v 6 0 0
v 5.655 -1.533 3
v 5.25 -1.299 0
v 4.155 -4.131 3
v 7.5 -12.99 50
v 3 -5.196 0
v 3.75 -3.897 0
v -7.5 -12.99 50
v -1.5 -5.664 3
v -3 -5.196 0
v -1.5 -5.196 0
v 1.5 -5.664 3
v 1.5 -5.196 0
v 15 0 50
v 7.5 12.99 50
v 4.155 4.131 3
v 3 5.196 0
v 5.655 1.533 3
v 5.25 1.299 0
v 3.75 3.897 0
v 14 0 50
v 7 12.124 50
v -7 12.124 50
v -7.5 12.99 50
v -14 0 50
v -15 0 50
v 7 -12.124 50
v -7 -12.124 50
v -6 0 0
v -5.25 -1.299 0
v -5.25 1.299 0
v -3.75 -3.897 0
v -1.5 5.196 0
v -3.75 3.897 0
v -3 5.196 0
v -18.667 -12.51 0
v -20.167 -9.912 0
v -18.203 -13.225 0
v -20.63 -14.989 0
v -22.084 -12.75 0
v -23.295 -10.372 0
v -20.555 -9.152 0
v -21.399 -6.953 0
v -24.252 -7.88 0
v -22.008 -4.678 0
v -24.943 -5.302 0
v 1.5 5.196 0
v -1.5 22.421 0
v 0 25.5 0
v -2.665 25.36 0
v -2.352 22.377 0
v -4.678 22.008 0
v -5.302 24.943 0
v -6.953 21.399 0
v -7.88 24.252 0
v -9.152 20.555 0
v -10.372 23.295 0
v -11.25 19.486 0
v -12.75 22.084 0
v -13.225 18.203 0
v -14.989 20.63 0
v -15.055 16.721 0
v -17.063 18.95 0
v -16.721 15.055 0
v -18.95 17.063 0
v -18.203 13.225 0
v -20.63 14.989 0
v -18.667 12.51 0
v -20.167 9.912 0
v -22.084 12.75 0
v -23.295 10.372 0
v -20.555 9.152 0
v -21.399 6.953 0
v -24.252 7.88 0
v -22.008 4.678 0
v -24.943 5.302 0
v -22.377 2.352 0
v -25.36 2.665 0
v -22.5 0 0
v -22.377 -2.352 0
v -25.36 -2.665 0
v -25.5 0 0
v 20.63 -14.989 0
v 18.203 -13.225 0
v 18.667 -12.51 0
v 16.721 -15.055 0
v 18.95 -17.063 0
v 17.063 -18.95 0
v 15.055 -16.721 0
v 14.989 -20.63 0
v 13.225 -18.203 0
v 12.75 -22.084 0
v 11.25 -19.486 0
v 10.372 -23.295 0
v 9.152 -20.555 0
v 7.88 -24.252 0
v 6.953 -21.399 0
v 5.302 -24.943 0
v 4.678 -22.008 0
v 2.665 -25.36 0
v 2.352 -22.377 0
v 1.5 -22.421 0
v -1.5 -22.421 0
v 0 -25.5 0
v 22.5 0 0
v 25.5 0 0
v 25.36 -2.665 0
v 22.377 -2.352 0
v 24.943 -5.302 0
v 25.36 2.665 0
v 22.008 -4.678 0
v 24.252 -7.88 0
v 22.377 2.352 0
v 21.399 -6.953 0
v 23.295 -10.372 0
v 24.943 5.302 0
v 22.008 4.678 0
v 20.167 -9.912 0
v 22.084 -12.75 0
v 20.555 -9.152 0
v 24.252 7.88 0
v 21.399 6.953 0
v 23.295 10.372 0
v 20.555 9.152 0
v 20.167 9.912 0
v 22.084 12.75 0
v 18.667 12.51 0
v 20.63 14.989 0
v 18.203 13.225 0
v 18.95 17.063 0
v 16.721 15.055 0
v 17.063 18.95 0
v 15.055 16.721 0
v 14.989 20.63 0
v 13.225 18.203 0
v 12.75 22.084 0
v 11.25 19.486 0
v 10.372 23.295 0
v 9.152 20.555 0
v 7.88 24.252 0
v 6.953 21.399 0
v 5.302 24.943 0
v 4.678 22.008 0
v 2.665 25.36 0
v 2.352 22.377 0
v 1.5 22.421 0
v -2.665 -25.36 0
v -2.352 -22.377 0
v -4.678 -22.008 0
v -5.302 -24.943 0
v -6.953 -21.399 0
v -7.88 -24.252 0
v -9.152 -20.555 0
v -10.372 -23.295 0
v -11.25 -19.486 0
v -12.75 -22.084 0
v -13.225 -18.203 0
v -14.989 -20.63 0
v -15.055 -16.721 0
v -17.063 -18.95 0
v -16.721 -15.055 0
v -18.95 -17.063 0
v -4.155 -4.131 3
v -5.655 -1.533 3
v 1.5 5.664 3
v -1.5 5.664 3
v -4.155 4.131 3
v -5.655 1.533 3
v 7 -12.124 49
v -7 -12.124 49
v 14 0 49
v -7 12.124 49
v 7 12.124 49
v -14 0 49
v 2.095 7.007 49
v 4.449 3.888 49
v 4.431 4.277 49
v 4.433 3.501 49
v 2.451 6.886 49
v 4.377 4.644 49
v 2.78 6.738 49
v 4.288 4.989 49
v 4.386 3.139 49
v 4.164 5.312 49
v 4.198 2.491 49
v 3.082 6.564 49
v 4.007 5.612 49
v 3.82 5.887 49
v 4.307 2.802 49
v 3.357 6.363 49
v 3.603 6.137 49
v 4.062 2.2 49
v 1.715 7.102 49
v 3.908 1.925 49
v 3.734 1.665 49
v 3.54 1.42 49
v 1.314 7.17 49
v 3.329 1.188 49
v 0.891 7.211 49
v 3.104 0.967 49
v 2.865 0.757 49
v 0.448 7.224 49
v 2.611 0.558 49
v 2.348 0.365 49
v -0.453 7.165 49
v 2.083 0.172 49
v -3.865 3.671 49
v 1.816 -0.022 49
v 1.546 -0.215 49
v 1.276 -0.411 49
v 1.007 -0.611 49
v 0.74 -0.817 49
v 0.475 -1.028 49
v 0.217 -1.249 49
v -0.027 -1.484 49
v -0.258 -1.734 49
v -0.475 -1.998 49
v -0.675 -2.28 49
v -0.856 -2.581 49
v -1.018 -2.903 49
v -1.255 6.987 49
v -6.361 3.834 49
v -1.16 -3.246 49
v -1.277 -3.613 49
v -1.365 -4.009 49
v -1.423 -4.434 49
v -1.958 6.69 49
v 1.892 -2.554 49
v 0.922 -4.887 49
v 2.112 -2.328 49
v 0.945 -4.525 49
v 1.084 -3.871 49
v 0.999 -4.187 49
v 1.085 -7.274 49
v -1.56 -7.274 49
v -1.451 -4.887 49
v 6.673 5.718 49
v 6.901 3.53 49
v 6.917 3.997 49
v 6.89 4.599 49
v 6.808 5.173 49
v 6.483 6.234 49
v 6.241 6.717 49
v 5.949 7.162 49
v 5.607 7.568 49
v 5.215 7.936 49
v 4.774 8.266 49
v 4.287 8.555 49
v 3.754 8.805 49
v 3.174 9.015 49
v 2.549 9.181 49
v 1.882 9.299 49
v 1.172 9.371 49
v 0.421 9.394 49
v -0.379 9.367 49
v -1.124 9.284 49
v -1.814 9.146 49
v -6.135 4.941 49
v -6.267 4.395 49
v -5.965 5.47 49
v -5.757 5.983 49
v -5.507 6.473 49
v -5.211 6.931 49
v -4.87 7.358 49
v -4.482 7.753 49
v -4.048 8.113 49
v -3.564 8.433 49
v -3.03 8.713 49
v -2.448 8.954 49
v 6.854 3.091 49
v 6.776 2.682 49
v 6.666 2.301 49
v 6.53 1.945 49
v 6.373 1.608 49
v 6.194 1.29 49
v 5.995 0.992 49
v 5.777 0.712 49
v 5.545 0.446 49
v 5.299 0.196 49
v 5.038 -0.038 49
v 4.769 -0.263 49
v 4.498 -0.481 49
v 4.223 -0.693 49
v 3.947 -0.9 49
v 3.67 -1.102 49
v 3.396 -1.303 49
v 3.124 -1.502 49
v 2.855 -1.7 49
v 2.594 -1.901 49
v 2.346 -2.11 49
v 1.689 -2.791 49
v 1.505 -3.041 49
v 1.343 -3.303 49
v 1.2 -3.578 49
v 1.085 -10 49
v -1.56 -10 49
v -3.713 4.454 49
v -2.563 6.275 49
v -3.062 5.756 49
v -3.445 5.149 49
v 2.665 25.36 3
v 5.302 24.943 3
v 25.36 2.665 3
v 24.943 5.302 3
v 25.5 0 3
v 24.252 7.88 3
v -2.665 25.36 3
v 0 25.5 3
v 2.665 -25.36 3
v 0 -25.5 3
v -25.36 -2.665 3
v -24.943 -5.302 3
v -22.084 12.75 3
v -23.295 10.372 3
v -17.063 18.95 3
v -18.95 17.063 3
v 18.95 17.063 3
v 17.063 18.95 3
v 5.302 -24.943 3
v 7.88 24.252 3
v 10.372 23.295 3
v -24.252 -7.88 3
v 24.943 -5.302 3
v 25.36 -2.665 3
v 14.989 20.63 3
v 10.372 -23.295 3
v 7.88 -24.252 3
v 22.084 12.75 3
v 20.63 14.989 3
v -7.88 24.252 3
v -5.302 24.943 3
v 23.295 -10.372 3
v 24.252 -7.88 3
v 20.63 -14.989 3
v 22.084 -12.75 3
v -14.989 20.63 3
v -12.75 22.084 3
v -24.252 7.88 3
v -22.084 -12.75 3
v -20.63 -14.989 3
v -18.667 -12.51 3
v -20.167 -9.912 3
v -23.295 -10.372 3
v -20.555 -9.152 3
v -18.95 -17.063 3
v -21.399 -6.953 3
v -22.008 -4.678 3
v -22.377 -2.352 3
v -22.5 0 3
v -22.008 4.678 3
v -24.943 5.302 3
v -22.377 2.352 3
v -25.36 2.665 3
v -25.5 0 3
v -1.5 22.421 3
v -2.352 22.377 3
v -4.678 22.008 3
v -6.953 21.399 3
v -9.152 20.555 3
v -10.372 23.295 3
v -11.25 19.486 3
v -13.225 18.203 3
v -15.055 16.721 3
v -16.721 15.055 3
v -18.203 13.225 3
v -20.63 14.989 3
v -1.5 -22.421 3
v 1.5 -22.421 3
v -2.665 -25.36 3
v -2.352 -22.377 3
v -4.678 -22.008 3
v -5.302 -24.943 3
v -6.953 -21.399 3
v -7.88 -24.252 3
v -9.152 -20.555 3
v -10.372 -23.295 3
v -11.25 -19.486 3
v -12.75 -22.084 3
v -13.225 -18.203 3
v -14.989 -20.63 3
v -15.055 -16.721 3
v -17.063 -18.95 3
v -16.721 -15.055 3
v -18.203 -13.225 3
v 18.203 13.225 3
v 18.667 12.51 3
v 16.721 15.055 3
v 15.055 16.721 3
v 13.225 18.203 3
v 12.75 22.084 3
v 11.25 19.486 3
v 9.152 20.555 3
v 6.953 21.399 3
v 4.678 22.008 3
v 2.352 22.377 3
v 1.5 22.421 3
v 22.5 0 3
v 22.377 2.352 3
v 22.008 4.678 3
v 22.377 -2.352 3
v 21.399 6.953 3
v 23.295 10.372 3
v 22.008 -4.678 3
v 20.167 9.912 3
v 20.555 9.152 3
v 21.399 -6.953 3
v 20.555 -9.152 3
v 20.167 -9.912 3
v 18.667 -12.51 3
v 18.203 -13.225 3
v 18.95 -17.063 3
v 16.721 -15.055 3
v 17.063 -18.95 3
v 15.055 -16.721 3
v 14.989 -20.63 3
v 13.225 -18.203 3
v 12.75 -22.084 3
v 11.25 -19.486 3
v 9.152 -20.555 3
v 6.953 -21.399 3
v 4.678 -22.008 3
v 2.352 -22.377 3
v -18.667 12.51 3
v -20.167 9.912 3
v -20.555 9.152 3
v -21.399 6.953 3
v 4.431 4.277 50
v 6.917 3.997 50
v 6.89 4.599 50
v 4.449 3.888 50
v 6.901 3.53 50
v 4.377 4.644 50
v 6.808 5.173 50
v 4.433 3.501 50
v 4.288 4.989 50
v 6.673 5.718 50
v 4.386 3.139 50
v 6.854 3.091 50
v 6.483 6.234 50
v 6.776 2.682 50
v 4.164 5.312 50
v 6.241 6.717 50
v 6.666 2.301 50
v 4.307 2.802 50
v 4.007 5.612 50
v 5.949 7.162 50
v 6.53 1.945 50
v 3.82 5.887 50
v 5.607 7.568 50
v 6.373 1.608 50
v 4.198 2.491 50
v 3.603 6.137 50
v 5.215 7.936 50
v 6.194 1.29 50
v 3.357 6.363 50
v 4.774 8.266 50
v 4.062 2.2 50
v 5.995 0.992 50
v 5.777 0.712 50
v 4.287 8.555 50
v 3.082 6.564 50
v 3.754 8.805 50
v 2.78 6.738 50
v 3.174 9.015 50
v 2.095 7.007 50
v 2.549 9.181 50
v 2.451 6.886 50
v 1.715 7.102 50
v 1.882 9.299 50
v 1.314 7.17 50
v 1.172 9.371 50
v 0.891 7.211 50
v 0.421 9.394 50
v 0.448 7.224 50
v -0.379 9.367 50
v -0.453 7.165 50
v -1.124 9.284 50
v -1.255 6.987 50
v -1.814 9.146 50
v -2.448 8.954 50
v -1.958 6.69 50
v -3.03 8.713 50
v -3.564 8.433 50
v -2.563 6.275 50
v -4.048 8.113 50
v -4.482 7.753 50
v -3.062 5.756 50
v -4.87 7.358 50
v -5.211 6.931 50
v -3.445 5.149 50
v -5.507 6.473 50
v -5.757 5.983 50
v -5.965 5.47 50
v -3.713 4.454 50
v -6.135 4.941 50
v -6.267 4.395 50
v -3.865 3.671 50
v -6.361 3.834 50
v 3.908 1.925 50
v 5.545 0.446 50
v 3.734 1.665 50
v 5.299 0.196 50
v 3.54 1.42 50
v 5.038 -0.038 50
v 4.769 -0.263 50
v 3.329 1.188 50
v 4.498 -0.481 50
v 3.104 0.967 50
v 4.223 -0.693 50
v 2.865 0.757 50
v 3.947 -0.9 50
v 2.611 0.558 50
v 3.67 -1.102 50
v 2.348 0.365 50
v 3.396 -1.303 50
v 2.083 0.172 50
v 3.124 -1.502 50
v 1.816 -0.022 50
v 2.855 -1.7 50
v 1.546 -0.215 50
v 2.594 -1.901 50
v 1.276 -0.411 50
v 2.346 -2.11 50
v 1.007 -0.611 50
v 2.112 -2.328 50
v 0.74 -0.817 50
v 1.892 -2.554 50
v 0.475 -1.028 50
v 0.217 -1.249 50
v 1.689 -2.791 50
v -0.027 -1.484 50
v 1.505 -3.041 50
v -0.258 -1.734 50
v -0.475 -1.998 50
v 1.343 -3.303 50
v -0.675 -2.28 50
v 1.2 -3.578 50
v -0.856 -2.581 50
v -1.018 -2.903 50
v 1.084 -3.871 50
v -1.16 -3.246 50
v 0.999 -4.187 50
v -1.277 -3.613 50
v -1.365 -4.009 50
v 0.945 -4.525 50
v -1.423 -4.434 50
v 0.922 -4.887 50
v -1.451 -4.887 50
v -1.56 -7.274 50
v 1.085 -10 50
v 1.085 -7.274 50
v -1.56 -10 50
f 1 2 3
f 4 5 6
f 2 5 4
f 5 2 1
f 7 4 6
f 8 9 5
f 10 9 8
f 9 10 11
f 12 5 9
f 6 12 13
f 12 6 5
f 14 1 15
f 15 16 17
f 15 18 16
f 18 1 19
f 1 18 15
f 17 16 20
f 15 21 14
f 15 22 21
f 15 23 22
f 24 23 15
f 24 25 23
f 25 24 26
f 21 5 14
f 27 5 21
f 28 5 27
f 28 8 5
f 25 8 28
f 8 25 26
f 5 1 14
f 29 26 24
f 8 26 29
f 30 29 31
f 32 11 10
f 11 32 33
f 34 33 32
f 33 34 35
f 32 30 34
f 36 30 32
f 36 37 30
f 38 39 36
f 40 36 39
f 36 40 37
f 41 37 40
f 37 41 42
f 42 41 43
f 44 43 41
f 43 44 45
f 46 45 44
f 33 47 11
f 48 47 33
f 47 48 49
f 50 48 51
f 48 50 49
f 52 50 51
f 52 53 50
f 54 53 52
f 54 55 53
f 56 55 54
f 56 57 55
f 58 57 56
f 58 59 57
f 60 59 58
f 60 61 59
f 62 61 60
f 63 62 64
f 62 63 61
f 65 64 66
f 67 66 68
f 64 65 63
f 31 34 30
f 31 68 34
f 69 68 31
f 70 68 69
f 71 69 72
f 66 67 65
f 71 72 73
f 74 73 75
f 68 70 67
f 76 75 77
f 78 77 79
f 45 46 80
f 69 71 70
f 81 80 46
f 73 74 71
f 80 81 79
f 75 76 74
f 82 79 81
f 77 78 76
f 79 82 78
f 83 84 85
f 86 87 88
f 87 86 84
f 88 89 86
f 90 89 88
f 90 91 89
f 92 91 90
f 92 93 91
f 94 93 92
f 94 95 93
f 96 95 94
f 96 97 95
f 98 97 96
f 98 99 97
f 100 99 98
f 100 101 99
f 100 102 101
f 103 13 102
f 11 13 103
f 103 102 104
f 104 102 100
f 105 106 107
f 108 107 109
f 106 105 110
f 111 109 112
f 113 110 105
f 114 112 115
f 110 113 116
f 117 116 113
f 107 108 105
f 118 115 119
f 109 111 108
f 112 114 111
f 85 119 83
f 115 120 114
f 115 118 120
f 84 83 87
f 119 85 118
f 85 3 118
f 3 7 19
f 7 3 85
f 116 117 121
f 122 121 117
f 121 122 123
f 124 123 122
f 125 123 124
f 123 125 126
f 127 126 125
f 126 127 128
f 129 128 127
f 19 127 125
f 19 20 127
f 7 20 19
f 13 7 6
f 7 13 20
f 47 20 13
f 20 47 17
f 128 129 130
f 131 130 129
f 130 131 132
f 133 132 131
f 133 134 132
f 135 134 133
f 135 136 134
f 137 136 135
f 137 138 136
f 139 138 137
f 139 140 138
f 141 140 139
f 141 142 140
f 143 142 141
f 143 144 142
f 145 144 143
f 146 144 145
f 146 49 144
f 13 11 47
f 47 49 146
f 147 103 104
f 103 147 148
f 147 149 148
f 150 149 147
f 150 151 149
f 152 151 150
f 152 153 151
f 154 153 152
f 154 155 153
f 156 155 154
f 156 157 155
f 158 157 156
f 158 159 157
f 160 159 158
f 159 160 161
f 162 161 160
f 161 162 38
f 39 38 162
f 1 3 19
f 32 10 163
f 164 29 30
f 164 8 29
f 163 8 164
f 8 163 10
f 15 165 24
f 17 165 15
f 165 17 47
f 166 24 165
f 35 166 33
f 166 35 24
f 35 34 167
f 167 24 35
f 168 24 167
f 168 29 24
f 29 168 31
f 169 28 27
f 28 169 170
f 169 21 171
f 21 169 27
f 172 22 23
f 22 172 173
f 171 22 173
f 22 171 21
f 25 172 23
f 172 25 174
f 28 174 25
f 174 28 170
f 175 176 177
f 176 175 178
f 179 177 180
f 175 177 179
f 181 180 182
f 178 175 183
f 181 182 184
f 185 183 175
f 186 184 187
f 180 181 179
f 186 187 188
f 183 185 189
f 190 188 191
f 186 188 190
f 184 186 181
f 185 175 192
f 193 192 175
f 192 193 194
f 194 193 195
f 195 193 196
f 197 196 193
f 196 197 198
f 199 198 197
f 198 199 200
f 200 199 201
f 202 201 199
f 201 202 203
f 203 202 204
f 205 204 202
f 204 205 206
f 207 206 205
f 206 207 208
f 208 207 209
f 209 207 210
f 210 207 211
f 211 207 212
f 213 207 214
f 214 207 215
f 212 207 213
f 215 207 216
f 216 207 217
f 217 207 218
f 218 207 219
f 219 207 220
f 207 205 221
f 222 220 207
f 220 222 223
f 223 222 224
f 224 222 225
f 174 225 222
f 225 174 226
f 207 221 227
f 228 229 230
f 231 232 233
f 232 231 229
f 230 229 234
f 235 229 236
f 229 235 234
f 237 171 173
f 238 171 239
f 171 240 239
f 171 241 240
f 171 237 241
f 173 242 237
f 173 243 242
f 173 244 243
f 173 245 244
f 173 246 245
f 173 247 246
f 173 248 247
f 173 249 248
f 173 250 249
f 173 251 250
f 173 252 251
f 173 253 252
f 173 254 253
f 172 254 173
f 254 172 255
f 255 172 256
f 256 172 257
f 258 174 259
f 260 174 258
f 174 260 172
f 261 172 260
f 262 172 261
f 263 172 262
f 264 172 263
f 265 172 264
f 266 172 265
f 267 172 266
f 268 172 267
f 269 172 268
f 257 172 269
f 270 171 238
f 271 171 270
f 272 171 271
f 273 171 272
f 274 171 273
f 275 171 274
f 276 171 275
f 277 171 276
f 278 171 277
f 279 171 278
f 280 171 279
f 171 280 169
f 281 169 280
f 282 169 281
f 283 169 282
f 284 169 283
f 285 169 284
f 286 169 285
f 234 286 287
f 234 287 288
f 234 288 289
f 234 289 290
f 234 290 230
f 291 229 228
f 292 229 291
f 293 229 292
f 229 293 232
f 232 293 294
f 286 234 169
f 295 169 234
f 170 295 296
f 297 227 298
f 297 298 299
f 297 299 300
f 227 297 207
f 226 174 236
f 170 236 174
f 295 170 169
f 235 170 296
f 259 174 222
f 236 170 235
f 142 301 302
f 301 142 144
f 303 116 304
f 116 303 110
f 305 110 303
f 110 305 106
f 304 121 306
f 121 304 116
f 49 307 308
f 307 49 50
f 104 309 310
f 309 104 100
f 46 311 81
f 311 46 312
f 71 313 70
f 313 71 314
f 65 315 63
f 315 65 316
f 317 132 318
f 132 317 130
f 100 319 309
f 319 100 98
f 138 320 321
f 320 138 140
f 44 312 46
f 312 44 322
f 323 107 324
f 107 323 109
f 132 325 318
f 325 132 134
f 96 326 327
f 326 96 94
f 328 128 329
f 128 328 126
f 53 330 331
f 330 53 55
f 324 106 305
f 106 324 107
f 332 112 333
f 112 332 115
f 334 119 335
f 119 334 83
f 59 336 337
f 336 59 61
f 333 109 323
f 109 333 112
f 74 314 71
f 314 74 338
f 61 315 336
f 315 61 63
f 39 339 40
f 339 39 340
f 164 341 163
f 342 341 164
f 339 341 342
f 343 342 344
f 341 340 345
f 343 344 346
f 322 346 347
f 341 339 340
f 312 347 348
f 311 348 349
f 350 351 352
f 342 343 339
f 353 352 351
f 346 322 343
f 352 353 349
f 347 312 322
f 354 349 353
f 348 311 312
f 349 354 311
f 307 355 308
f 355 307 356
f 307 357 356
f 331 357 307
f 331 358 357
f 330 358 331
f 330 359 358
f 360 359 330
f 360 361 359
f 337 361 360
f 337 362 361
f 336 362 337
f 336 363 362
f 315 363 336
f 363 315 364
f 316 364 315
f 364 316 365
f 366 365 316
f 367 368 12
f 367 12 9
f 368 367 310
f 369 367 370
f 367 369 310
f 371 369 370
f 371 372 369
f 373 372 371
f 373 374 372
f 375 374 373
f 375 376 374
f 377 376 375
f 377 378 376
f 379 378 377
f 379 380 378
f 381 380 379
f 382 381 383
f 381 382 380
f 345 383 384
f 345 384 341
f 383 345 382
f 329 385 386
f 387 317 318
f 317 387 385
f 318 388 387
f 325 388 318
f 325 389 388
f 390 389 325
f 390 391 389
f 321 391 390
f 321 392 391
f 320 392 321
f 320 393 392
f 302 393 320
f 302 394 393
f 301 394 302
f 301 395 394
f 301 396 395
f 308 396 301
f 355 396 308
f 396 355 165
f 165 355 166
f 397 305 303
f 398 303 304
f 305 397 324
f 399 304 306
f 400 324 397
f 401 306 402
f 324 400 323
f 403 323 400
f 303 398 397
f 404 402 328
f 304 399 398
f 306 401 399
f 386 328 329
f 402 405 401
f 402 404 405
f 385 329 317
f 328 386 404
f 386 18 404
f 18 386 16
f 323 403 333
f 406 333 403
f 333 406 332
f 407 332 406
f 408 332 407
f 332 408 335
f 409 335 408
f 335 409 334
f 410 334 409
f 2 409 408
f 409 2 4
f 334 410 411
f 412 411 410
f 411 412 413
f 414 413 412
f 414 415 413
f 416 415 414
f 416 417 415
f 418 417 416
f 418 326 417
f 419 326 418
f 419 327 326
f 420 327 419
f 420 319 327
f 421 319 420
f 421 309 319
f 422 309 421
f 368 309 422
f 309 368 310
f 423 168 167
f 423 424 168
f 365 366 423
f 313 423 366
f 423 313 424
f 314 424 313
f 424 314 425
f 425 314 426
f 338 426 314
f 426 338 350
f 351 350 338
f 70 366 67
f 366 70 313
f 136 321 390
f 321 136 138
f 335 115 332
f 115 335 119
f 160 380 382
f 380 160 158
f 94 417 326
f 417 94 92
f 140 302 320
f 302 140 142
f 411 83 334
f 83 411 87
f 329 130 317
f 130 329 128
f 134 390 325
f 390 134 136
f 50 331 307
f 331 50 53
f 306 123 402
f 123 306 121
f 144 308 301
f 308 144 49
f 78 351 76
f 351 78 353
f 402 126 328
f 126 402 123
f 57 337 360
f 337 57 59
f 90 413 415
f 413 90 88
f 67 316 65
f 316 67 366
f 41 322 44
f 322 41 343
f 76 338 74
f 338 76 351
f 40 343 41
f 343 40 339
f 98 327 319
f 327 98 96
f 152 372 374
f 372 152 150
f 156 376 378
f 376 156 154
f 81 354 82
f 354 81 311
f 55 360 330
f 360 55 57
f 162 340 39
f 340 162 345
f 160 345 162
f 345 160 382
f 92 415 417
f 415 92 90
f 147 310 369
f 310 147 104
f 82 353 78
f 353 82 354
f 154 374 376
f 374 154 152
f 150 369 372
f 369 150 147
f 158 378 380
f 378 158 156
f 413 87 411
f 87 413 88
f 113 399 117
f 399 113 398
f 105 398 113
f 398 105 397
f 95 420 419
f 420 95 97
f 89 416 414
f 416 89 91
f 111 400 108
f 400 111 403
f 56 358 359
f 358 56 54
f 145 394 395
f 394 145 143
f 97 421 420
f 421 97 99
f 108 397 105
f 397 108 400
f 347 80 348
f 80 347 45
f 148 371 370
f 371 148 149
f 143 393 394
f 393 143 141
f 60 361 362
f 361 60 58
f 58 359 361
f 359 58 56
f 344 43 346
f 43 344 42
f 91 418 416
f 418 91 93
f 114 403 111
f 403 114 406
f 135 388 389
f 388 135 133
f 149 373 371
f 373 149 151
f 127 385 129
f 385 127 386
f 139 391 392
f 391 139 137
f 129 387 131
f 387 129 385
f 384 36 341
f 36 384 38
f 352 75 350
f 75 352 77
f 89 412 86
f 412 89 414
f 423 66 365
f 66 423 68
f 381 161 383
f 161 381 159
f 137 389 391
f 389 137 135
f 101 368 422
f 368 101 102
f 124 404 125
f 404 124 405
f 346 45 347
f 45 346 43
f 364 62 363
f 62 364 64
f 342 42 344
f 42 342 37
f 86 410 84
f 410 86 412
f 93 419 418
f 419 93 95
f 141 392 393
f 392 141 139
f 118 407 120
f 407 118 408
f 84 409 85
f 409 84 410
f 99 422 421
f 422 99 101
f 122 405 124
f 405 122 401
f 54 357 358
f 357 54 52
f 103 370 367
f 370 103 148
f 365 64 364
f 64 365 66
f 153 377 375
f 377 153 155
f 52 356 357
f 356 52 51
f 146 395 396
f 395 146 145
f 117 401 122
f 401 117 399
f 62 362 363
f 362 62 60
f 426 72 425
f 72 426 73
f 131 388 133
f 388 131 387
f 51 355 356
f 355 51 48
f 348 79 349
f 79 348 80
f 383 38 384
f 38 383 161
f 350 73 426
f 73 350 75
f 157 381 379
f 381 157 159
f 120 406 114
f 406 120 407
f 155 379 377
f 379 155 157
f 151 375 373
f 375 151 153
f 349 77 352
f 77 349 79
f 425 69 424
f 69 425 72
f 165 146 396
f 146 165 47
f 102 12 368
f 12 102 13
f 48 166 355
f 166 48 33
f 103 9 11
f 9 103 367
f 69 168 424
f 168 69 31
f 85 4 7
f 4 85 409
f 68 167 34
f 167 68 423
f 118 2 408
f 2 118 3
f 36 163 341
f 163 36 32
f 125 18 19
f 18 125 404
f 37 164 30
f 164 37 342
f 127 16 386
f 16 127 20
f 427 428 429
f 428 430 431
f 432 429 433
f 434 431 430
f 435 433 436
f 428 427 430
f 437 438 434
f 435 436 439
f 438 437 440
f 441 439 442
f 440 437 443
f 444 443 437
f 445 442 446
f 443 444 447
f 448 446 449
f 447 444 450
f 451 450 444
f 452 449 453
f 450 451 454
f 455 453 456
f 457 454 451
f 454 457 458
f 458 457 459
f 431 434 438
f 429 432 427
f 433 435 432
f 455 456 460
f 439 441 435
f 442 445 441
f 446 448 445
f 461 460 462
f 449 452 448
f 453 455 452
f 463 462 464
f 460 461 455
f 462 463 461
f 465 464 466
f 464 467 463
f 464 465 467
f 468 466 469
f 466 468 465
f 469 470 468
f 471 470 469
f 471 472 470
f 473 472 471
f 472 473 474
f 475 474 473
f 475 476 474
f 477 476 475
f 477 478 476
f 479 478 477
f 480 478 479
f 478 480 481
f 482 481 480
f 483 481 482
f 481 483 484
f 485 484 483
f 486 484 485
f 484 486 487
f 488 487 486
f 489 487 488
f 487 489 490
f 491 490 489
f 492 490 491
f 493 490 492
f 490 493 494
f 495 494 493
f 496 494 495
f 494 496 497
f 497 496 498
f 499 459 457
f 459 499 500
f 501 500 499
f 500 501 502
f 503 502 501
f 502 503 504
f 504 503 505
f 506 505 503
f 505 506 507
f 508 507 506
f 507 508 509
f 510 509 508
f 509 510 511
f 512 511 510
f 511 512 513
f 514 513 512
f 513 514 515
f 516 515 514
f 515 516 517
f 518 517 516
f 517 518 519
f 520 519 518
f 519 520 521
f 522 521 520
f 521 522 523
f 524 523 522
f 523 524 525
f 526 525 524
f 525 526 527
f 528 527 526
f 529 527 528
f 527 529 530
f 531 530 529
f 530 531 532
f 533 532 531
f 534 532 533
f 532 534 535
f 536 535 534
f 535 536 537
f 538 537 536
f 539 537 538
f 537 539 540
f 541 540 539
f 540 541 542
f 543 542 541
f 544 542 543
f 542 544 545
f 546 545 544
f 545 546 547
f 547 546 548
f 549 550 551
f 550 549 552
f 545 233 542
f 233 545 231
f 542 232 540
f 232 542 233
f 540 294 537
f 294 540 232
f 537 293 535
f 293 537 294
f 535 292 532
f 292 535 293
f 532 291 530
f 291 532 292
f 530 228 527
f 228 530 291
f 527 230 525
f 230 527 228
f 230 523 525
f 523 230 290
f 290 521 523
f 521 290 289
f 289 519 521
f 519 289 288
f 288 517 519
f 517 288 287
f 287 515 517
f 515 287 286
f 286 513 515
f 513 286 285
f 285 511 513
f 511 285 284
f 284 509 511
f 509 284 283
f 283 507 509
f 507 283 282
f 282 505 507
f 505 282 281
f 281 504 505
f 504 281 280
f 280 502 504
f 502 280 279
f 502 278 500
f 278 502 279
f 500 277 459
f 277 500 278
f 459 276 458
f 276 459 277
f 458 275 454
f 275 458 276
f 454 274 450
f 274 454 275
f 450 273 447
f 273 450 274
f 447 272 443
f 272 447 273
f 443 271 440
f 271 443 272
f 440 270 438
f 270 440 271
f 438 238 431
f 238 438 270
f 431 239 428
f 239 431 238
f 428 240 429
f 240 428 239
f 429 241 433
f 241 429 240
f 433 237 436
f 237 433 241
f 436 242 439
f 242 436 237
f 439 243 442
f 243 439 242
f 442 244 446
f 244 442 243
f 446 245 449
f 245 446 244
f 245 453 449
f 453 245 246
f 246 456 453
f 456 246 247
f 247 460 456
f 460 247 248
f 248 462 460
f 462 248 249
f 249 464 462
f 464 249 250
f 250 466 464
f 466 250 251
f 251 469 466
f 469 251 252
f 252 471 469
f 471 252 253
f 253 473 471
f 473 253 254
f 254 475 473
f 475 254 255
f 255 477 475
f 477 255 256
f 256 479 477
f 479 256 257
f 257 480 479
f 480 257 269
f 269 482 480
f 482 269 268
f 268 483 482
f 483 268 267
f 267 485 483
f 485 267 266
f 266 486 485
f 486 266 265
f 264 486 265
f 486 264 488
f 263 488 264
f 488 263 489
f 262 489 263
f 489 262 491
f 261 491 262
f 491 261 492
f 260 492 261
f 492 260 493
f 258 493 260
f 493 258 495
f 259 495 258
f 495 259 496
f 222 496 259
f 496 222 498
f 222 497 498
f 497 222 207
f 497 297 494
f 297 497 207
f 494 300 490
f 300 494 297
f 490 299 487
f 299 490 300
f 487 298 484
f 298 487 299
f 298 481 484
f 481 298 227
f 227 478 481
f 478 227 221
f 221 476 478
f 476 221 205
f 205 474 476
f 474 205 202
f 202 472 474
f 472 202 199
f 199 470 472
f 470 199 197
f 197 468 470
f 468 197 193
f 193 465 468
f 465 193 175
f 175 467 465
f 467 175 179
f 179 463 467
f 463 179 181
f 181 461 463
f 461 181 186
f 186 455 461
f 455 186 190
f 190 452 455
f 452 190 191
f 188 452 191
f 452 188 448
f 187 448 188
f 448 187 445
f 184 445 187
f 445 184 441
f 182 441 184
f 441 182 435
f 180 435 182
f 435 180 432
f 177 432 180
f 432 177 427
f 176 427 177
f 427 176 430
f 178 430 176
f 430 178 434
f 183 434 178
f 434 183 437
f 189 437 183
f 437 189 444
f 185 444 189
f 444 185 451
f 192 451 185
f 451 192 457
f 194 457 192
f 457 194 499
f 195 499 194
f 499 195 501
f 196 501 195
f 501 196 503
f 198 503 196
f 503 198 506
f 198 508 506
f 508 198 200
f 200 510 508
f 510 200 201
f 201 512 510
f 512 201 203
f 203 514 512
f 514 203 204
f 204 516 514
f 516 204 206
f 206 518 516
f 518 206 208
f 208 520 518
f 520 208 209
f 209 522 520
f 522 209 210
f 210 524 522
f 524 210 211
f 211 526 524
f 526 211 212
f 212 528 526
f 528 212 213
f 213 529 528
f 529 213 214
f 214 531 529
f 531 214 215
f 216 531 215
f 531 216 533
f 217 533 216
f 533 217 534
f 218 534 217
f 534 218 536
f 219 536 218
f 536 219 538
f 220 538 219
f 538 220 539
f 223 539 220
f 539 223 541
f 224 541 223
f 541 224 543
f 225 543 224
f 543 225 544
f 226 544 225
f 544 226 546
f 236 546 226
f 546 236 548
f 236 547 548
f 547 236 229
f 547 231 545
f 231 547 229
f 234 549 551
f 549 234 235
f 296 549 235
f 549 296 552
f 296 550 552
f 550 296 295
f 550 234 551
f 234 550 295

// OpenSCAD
module pawn(){ 

difference(){
union(){
//crosspiece on base    
translate([0,0,1.5])rotate(0,0,0)cube([3,50,3],center=true);    
translate([0,0,1.5])rotate(60,0,0)cube([3,50,3],center=true);   
translate([0,0,1.5])rotate(120,0,0)cube([3,50,3],center=true);   

//main body pawn
difference(){    
cylinder(d1=12,d2=30,h=50,$fn=6);
translate([0,0,49])cylinder(d1=28,d2=28,h=1,$fn=6);

}
// ring on base
difference(){
    cylinder(d=51,h=3,$fn=60);
    cylinder(d=45,h=3,$fn=60);
}

  
}


}
//question mark
translate([-7.5,-10,49])linear_extrude(height=1)text("?",size=20);

}

module question(){ 
difference(){
    

translate([0,0,49])cylinder(d=28,d2=28,h=1,$fn=6);
translate([-7.5,-10,49])linear_extrude(height=1)text("?",size=20);

}

difference(){
    translate([0,0,3])cylinder(d=51,h=1,$fn=60);
    translate([0,0,3])cylinder(d=45,h=1,$fn=60);
}
    translate([0,0,3.5])rotate(0,0,0)cube([3,50,1],center=true);    
    translate([0,0,3.5])rotate(60,0,0)cube([3,50,1],center=true);   
    translate([0,0,3.5])rotate(120,0,0)cube([3,50,1],center=true);   

}



color("white")pawn();
//color("black")question();
